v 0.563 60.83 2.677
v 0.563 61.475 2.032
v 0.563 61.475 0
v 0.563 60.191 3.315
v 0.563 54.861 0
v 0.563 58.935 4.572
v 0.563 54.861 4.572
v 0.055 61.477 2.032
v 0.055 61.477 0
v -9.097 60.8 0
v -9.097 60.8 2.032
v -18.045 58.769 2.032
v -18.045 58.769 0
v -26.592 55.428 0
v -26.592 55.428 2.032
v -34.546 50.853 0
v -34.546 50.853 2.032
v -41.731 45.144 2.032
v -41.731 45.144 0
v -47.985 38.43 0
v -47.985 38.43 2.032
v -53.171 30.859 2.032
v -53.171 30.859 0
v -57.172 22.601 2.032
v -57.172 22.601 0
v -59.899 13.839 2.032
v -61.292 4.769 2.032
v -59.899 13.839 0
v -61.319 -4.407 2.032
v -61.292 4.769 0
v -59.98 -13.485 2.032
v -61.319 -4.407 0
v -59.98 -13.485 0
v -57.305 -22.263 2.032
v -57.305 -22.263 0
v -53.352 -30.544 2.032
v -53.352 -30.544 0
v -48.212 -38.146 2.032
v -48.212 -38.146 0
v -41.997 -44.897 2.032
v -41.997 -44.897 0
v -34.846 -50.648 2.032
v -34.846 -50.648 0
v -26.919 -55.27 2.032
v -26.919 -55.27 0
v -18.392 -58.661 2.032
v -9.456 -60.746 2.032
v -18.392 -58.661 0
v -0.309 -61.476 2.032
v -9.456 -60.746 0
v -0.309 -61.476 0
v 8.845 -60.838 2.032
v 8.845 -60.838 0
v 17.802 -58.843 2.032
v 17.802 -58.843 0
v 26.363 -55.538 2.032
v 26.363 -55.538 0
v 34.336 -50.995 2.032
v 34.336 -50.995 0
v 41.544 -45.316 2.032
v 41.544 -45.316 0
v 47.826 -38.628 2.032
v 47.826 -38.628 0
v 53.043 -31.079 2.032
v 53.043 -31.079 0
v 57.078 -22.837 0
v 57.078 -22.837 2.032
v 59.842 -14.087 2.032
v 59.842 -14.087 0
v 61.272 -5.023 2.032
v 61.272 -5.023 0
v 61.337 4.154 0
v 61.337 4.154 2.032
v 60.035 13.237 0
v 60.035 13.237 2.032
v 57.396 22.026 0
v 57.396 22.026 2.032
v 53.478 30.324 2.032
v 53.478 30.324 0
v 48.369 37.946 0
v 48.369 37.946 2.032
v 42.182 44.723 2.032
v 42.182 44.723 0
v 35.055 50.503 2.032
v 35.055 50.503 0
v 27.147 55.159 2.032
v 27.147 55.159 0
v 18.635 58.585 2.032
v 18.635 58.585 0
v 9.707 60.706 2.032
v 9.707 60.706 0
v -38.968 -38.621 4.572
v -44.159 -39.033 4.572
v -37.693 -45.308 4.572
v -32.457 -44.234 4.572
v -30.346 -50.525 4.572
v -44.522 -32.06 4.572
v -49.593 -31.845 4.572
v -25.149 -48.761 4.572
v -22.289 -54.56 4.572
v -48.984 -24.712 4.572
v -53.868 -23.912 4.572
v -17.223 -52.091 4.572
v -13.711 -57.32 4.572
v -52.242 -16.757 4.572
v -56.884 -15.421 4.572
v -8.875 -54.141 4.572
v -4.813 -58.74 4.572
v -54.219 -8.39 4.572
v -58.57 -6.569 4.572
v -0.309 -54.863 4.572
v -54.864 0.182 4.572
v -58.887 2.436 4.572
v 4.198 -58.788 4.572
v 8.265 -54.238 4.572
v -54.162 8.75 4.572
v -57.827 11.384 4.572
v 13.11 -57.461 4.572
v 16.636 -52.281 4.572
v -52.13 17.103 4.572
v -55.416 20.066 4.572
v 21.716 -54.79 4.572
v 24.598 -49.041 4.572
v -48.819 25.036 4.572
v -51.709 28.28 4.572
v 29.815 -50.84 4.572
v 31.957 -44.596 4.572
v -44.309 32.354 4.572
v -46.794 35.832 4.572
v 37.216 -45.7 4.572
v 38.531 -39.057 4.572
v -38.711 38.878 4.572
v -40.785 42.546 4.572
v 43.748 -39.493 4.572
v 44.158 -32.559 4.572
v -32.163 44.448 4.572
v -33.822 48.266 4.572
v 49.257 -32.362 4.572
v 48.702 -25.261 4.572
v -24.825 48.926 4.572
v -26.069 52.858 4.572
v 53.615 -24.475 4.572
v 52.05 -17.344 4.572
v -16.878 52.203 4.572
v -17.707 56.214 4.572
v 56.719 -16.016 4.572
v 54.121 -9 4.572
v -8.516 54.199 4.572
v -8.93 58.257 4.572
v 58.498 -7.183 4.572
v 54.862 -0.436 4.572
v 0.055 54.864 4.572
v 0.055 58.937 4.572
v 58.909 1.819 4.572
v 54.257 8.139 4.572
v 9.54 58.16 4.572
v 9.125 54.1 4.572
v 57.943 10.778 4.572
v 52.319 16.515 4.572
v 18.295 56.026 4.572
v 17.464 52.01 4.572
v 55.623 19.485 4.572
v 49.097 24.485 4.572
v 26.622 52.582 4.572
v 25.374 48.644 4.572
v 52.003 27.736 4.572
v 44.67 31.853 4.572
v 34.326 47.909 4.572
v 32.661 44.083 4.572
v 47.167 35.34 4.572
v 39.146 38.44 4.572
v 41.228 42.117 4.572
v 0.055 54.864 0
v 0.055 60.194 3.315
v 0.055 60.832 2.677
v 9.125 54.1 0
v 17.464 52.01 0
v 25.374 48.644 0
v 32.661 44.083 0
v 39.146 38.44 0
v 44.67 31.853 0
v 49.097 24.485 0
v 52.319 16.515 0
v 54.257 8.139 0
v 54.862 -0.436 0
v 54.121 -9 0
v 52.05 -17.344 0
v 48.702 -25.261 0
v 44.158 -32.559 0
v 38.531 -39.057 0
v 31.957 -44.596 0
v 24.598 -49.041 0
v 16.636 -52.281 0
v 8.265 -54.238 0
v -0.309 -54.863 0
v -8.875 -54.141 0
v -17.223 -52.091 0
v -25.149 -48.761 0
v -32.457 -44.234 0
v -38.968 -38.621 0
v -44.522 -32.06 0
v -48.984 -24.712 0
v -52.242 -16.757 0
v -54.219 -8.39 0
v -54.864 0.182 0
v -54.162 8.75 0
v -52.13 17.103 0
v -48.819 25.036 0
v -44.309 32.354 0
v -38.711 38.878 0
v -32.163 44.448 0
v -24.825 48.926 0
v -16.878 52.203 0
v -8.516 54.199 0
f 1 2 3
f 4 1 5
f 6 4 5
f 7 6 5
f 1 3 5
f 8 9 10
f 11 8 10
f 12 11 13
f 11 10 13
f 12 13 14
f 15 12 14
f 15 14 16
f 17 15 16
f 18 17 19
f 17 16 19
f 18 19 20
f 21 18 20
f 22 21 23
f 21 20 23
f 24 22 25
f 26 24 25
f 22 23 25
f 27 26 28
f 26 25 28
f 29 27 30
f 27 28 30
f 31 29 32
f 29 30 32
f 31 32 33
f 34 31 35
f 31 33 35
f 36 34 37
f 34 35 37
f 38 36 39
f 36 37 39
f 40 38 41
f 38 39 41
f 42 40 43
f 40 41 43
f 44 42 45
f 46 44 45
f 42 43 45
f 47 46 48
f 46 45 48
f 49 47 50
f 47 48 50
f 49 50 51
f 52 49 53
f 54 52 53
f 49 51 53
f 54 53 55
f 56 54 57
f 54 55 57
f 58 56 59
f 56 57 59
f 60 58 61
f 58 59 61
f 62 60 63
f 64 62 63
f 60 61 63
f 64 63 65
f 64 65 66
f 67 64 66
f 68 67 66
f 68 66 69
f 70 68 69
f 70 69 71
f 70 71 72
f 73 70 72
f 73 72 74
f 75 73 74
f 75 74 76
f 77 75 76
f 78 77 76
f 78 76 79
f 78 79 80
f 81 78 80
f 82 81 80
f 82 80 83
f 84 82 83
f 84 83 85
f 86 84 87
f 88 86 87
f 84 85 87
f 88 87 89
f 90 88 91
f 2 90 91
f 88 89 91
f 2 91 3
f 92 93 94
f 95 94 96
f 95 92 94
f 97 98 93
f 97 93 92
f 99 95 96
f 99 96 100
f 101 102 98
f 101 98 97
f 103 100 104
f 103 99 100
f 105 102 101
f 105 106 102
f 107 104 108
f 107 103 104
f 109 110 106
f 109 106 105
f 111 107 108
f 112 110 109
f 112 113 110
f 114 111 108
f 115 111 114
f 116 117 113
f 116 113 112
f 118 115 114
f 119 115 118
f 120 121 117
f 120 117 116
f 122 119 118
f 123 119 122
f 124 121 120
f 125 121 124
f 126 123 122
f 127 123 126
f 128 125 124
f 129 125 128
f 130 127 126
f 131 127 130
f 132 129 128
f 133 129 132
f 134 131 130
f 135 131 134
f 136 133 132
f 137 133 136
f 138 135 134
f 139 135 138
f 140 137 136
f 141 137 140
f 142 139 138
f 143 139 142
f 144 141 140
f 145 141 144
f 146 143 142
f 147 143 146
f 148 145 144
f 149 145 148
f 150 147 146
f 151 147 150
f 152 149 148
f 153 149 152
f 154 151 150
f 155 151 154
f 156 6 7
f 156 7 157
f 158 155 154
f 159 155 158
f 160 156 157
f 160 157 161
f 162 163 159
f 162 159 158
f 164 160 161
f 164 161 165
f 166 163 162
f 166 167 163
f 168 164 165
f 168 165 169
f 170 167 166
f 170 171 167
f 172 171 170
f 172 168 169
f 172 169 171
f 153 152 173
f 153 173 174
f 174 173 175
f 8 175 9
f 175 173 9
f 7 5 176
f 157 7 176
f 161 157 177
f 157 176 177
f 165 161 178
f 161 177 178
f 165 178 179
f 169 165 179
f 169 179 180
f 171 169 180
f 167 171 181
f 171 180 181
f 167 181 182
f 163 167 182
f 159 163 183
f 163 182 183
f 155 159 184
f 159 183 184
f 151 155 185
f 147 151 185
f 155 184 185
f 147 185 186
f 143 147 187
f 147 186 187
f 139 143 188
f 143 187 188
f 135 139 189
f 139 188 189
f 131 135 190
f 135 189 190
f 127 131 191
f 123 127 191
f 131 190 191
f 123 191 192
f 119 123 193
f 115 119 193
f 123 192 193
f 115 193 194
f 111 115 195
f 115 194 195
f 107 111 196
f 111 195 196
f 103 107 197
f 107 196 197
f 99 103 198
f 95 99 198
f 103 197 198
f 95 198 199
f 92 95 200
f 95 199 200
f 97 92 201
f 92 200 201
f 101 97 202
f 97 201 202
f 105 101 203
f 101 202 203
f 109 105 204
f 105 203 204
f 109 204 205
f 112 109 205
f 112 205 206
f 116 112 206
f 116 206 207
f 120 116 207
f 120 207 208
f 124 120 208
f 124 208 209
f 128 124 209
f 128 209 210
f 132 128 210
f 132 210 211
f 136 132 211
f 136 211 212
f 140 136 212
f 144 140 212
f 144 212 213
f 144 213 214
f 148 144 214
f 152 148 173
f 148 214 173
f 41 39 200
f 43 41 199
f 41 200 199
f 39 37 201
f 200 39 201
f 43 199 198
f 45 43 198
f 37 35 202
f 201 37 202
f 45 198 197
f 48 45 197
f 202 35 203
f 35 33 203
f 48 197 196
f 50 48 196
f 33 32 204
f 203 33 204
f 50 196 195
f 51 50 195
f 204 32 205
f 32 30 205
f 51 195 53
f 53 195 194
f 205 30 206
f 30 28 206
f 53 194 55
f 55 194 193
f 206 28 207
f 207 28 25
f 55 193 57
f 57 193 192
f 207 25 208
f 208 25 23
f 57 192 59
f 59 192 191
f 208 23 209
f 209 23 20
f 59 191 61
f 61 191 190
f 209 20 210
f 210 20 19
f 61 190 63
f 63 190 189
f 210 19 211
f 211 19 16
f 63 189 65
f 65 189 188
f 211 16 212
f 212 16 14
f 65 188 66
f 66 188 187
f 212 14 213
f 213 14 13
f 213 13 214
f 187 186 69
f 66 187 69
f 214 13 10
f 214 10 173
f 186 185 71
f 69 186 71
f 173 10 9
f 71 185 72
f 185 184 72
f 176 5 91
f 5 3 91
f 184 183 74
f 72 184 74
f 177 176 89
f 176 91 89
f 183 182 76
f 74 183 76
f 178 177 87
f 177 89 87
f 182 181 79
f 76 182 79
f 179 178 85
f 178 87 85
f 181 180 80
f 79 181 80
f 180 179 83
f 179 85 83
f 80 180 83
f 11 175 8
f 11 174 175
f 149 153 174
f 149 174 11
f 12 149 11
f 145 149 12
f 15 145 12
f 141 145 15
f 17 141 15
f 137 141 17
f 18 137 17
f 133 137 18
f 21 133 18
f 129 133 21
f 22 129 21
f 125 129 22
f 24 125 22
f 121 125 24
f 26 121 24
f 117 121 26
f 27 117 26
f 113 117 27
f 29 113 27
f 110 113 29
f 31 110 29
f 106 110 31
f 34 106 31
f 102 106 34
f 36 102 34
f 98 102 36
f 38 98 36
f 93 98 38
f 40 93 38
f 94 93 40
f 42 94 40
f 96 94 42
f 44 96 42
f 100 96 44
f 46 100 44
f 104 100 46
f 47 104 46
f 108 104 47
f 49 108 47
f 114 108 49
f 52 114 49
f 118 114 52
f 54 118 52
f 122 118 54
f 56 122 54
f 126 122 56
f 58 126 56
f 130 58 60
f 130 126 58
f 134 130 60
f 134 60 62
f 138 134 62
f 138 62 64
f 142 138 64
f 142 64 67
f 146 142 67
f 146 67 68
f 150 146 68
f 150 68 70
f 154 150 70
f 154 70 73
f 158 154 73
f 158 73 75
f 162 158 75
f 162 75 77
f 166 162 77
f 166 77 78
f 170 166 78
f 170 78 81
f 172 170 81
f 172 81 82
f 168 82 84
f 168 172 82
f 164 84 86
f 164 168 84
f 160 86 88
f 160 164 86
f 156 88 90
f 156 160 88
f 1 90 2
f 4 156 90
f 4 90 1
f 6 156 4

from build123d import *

# Parameters (mm, degrees)
F1_DEPTH = 4.572
F2_SIZE  = 2.54


with BuildPart() as f1:
    # F0 (on Top) → F1 (new body)
    with BuildSketch(Plane.XY):
        with BuildLine():
            ThreePointArc((0.56272, 54.861114), (-0.308723, -54.863131), (0.05472, 54.863973))
            Line((0.05472, 54.863973), (0.05472, 61.477178))
            ThreePointArc((0.05472, 61.477178), (-0.308722, -61.476427), (0.56272, 61.474627))
            Line((0.56272, 61.474627), (0.56272, 54.861114))
        make_face()
    extrude(amount=F1_DEPTH)

    # F2
    f2_edges = [f1.edges().sort_by_distance(p)[0] for p in [
        (-0.308722, -61.476427, 4.572),
    ]]
    chamfer(f2_edges, length=F2_SIZE)


solid = f1.part
